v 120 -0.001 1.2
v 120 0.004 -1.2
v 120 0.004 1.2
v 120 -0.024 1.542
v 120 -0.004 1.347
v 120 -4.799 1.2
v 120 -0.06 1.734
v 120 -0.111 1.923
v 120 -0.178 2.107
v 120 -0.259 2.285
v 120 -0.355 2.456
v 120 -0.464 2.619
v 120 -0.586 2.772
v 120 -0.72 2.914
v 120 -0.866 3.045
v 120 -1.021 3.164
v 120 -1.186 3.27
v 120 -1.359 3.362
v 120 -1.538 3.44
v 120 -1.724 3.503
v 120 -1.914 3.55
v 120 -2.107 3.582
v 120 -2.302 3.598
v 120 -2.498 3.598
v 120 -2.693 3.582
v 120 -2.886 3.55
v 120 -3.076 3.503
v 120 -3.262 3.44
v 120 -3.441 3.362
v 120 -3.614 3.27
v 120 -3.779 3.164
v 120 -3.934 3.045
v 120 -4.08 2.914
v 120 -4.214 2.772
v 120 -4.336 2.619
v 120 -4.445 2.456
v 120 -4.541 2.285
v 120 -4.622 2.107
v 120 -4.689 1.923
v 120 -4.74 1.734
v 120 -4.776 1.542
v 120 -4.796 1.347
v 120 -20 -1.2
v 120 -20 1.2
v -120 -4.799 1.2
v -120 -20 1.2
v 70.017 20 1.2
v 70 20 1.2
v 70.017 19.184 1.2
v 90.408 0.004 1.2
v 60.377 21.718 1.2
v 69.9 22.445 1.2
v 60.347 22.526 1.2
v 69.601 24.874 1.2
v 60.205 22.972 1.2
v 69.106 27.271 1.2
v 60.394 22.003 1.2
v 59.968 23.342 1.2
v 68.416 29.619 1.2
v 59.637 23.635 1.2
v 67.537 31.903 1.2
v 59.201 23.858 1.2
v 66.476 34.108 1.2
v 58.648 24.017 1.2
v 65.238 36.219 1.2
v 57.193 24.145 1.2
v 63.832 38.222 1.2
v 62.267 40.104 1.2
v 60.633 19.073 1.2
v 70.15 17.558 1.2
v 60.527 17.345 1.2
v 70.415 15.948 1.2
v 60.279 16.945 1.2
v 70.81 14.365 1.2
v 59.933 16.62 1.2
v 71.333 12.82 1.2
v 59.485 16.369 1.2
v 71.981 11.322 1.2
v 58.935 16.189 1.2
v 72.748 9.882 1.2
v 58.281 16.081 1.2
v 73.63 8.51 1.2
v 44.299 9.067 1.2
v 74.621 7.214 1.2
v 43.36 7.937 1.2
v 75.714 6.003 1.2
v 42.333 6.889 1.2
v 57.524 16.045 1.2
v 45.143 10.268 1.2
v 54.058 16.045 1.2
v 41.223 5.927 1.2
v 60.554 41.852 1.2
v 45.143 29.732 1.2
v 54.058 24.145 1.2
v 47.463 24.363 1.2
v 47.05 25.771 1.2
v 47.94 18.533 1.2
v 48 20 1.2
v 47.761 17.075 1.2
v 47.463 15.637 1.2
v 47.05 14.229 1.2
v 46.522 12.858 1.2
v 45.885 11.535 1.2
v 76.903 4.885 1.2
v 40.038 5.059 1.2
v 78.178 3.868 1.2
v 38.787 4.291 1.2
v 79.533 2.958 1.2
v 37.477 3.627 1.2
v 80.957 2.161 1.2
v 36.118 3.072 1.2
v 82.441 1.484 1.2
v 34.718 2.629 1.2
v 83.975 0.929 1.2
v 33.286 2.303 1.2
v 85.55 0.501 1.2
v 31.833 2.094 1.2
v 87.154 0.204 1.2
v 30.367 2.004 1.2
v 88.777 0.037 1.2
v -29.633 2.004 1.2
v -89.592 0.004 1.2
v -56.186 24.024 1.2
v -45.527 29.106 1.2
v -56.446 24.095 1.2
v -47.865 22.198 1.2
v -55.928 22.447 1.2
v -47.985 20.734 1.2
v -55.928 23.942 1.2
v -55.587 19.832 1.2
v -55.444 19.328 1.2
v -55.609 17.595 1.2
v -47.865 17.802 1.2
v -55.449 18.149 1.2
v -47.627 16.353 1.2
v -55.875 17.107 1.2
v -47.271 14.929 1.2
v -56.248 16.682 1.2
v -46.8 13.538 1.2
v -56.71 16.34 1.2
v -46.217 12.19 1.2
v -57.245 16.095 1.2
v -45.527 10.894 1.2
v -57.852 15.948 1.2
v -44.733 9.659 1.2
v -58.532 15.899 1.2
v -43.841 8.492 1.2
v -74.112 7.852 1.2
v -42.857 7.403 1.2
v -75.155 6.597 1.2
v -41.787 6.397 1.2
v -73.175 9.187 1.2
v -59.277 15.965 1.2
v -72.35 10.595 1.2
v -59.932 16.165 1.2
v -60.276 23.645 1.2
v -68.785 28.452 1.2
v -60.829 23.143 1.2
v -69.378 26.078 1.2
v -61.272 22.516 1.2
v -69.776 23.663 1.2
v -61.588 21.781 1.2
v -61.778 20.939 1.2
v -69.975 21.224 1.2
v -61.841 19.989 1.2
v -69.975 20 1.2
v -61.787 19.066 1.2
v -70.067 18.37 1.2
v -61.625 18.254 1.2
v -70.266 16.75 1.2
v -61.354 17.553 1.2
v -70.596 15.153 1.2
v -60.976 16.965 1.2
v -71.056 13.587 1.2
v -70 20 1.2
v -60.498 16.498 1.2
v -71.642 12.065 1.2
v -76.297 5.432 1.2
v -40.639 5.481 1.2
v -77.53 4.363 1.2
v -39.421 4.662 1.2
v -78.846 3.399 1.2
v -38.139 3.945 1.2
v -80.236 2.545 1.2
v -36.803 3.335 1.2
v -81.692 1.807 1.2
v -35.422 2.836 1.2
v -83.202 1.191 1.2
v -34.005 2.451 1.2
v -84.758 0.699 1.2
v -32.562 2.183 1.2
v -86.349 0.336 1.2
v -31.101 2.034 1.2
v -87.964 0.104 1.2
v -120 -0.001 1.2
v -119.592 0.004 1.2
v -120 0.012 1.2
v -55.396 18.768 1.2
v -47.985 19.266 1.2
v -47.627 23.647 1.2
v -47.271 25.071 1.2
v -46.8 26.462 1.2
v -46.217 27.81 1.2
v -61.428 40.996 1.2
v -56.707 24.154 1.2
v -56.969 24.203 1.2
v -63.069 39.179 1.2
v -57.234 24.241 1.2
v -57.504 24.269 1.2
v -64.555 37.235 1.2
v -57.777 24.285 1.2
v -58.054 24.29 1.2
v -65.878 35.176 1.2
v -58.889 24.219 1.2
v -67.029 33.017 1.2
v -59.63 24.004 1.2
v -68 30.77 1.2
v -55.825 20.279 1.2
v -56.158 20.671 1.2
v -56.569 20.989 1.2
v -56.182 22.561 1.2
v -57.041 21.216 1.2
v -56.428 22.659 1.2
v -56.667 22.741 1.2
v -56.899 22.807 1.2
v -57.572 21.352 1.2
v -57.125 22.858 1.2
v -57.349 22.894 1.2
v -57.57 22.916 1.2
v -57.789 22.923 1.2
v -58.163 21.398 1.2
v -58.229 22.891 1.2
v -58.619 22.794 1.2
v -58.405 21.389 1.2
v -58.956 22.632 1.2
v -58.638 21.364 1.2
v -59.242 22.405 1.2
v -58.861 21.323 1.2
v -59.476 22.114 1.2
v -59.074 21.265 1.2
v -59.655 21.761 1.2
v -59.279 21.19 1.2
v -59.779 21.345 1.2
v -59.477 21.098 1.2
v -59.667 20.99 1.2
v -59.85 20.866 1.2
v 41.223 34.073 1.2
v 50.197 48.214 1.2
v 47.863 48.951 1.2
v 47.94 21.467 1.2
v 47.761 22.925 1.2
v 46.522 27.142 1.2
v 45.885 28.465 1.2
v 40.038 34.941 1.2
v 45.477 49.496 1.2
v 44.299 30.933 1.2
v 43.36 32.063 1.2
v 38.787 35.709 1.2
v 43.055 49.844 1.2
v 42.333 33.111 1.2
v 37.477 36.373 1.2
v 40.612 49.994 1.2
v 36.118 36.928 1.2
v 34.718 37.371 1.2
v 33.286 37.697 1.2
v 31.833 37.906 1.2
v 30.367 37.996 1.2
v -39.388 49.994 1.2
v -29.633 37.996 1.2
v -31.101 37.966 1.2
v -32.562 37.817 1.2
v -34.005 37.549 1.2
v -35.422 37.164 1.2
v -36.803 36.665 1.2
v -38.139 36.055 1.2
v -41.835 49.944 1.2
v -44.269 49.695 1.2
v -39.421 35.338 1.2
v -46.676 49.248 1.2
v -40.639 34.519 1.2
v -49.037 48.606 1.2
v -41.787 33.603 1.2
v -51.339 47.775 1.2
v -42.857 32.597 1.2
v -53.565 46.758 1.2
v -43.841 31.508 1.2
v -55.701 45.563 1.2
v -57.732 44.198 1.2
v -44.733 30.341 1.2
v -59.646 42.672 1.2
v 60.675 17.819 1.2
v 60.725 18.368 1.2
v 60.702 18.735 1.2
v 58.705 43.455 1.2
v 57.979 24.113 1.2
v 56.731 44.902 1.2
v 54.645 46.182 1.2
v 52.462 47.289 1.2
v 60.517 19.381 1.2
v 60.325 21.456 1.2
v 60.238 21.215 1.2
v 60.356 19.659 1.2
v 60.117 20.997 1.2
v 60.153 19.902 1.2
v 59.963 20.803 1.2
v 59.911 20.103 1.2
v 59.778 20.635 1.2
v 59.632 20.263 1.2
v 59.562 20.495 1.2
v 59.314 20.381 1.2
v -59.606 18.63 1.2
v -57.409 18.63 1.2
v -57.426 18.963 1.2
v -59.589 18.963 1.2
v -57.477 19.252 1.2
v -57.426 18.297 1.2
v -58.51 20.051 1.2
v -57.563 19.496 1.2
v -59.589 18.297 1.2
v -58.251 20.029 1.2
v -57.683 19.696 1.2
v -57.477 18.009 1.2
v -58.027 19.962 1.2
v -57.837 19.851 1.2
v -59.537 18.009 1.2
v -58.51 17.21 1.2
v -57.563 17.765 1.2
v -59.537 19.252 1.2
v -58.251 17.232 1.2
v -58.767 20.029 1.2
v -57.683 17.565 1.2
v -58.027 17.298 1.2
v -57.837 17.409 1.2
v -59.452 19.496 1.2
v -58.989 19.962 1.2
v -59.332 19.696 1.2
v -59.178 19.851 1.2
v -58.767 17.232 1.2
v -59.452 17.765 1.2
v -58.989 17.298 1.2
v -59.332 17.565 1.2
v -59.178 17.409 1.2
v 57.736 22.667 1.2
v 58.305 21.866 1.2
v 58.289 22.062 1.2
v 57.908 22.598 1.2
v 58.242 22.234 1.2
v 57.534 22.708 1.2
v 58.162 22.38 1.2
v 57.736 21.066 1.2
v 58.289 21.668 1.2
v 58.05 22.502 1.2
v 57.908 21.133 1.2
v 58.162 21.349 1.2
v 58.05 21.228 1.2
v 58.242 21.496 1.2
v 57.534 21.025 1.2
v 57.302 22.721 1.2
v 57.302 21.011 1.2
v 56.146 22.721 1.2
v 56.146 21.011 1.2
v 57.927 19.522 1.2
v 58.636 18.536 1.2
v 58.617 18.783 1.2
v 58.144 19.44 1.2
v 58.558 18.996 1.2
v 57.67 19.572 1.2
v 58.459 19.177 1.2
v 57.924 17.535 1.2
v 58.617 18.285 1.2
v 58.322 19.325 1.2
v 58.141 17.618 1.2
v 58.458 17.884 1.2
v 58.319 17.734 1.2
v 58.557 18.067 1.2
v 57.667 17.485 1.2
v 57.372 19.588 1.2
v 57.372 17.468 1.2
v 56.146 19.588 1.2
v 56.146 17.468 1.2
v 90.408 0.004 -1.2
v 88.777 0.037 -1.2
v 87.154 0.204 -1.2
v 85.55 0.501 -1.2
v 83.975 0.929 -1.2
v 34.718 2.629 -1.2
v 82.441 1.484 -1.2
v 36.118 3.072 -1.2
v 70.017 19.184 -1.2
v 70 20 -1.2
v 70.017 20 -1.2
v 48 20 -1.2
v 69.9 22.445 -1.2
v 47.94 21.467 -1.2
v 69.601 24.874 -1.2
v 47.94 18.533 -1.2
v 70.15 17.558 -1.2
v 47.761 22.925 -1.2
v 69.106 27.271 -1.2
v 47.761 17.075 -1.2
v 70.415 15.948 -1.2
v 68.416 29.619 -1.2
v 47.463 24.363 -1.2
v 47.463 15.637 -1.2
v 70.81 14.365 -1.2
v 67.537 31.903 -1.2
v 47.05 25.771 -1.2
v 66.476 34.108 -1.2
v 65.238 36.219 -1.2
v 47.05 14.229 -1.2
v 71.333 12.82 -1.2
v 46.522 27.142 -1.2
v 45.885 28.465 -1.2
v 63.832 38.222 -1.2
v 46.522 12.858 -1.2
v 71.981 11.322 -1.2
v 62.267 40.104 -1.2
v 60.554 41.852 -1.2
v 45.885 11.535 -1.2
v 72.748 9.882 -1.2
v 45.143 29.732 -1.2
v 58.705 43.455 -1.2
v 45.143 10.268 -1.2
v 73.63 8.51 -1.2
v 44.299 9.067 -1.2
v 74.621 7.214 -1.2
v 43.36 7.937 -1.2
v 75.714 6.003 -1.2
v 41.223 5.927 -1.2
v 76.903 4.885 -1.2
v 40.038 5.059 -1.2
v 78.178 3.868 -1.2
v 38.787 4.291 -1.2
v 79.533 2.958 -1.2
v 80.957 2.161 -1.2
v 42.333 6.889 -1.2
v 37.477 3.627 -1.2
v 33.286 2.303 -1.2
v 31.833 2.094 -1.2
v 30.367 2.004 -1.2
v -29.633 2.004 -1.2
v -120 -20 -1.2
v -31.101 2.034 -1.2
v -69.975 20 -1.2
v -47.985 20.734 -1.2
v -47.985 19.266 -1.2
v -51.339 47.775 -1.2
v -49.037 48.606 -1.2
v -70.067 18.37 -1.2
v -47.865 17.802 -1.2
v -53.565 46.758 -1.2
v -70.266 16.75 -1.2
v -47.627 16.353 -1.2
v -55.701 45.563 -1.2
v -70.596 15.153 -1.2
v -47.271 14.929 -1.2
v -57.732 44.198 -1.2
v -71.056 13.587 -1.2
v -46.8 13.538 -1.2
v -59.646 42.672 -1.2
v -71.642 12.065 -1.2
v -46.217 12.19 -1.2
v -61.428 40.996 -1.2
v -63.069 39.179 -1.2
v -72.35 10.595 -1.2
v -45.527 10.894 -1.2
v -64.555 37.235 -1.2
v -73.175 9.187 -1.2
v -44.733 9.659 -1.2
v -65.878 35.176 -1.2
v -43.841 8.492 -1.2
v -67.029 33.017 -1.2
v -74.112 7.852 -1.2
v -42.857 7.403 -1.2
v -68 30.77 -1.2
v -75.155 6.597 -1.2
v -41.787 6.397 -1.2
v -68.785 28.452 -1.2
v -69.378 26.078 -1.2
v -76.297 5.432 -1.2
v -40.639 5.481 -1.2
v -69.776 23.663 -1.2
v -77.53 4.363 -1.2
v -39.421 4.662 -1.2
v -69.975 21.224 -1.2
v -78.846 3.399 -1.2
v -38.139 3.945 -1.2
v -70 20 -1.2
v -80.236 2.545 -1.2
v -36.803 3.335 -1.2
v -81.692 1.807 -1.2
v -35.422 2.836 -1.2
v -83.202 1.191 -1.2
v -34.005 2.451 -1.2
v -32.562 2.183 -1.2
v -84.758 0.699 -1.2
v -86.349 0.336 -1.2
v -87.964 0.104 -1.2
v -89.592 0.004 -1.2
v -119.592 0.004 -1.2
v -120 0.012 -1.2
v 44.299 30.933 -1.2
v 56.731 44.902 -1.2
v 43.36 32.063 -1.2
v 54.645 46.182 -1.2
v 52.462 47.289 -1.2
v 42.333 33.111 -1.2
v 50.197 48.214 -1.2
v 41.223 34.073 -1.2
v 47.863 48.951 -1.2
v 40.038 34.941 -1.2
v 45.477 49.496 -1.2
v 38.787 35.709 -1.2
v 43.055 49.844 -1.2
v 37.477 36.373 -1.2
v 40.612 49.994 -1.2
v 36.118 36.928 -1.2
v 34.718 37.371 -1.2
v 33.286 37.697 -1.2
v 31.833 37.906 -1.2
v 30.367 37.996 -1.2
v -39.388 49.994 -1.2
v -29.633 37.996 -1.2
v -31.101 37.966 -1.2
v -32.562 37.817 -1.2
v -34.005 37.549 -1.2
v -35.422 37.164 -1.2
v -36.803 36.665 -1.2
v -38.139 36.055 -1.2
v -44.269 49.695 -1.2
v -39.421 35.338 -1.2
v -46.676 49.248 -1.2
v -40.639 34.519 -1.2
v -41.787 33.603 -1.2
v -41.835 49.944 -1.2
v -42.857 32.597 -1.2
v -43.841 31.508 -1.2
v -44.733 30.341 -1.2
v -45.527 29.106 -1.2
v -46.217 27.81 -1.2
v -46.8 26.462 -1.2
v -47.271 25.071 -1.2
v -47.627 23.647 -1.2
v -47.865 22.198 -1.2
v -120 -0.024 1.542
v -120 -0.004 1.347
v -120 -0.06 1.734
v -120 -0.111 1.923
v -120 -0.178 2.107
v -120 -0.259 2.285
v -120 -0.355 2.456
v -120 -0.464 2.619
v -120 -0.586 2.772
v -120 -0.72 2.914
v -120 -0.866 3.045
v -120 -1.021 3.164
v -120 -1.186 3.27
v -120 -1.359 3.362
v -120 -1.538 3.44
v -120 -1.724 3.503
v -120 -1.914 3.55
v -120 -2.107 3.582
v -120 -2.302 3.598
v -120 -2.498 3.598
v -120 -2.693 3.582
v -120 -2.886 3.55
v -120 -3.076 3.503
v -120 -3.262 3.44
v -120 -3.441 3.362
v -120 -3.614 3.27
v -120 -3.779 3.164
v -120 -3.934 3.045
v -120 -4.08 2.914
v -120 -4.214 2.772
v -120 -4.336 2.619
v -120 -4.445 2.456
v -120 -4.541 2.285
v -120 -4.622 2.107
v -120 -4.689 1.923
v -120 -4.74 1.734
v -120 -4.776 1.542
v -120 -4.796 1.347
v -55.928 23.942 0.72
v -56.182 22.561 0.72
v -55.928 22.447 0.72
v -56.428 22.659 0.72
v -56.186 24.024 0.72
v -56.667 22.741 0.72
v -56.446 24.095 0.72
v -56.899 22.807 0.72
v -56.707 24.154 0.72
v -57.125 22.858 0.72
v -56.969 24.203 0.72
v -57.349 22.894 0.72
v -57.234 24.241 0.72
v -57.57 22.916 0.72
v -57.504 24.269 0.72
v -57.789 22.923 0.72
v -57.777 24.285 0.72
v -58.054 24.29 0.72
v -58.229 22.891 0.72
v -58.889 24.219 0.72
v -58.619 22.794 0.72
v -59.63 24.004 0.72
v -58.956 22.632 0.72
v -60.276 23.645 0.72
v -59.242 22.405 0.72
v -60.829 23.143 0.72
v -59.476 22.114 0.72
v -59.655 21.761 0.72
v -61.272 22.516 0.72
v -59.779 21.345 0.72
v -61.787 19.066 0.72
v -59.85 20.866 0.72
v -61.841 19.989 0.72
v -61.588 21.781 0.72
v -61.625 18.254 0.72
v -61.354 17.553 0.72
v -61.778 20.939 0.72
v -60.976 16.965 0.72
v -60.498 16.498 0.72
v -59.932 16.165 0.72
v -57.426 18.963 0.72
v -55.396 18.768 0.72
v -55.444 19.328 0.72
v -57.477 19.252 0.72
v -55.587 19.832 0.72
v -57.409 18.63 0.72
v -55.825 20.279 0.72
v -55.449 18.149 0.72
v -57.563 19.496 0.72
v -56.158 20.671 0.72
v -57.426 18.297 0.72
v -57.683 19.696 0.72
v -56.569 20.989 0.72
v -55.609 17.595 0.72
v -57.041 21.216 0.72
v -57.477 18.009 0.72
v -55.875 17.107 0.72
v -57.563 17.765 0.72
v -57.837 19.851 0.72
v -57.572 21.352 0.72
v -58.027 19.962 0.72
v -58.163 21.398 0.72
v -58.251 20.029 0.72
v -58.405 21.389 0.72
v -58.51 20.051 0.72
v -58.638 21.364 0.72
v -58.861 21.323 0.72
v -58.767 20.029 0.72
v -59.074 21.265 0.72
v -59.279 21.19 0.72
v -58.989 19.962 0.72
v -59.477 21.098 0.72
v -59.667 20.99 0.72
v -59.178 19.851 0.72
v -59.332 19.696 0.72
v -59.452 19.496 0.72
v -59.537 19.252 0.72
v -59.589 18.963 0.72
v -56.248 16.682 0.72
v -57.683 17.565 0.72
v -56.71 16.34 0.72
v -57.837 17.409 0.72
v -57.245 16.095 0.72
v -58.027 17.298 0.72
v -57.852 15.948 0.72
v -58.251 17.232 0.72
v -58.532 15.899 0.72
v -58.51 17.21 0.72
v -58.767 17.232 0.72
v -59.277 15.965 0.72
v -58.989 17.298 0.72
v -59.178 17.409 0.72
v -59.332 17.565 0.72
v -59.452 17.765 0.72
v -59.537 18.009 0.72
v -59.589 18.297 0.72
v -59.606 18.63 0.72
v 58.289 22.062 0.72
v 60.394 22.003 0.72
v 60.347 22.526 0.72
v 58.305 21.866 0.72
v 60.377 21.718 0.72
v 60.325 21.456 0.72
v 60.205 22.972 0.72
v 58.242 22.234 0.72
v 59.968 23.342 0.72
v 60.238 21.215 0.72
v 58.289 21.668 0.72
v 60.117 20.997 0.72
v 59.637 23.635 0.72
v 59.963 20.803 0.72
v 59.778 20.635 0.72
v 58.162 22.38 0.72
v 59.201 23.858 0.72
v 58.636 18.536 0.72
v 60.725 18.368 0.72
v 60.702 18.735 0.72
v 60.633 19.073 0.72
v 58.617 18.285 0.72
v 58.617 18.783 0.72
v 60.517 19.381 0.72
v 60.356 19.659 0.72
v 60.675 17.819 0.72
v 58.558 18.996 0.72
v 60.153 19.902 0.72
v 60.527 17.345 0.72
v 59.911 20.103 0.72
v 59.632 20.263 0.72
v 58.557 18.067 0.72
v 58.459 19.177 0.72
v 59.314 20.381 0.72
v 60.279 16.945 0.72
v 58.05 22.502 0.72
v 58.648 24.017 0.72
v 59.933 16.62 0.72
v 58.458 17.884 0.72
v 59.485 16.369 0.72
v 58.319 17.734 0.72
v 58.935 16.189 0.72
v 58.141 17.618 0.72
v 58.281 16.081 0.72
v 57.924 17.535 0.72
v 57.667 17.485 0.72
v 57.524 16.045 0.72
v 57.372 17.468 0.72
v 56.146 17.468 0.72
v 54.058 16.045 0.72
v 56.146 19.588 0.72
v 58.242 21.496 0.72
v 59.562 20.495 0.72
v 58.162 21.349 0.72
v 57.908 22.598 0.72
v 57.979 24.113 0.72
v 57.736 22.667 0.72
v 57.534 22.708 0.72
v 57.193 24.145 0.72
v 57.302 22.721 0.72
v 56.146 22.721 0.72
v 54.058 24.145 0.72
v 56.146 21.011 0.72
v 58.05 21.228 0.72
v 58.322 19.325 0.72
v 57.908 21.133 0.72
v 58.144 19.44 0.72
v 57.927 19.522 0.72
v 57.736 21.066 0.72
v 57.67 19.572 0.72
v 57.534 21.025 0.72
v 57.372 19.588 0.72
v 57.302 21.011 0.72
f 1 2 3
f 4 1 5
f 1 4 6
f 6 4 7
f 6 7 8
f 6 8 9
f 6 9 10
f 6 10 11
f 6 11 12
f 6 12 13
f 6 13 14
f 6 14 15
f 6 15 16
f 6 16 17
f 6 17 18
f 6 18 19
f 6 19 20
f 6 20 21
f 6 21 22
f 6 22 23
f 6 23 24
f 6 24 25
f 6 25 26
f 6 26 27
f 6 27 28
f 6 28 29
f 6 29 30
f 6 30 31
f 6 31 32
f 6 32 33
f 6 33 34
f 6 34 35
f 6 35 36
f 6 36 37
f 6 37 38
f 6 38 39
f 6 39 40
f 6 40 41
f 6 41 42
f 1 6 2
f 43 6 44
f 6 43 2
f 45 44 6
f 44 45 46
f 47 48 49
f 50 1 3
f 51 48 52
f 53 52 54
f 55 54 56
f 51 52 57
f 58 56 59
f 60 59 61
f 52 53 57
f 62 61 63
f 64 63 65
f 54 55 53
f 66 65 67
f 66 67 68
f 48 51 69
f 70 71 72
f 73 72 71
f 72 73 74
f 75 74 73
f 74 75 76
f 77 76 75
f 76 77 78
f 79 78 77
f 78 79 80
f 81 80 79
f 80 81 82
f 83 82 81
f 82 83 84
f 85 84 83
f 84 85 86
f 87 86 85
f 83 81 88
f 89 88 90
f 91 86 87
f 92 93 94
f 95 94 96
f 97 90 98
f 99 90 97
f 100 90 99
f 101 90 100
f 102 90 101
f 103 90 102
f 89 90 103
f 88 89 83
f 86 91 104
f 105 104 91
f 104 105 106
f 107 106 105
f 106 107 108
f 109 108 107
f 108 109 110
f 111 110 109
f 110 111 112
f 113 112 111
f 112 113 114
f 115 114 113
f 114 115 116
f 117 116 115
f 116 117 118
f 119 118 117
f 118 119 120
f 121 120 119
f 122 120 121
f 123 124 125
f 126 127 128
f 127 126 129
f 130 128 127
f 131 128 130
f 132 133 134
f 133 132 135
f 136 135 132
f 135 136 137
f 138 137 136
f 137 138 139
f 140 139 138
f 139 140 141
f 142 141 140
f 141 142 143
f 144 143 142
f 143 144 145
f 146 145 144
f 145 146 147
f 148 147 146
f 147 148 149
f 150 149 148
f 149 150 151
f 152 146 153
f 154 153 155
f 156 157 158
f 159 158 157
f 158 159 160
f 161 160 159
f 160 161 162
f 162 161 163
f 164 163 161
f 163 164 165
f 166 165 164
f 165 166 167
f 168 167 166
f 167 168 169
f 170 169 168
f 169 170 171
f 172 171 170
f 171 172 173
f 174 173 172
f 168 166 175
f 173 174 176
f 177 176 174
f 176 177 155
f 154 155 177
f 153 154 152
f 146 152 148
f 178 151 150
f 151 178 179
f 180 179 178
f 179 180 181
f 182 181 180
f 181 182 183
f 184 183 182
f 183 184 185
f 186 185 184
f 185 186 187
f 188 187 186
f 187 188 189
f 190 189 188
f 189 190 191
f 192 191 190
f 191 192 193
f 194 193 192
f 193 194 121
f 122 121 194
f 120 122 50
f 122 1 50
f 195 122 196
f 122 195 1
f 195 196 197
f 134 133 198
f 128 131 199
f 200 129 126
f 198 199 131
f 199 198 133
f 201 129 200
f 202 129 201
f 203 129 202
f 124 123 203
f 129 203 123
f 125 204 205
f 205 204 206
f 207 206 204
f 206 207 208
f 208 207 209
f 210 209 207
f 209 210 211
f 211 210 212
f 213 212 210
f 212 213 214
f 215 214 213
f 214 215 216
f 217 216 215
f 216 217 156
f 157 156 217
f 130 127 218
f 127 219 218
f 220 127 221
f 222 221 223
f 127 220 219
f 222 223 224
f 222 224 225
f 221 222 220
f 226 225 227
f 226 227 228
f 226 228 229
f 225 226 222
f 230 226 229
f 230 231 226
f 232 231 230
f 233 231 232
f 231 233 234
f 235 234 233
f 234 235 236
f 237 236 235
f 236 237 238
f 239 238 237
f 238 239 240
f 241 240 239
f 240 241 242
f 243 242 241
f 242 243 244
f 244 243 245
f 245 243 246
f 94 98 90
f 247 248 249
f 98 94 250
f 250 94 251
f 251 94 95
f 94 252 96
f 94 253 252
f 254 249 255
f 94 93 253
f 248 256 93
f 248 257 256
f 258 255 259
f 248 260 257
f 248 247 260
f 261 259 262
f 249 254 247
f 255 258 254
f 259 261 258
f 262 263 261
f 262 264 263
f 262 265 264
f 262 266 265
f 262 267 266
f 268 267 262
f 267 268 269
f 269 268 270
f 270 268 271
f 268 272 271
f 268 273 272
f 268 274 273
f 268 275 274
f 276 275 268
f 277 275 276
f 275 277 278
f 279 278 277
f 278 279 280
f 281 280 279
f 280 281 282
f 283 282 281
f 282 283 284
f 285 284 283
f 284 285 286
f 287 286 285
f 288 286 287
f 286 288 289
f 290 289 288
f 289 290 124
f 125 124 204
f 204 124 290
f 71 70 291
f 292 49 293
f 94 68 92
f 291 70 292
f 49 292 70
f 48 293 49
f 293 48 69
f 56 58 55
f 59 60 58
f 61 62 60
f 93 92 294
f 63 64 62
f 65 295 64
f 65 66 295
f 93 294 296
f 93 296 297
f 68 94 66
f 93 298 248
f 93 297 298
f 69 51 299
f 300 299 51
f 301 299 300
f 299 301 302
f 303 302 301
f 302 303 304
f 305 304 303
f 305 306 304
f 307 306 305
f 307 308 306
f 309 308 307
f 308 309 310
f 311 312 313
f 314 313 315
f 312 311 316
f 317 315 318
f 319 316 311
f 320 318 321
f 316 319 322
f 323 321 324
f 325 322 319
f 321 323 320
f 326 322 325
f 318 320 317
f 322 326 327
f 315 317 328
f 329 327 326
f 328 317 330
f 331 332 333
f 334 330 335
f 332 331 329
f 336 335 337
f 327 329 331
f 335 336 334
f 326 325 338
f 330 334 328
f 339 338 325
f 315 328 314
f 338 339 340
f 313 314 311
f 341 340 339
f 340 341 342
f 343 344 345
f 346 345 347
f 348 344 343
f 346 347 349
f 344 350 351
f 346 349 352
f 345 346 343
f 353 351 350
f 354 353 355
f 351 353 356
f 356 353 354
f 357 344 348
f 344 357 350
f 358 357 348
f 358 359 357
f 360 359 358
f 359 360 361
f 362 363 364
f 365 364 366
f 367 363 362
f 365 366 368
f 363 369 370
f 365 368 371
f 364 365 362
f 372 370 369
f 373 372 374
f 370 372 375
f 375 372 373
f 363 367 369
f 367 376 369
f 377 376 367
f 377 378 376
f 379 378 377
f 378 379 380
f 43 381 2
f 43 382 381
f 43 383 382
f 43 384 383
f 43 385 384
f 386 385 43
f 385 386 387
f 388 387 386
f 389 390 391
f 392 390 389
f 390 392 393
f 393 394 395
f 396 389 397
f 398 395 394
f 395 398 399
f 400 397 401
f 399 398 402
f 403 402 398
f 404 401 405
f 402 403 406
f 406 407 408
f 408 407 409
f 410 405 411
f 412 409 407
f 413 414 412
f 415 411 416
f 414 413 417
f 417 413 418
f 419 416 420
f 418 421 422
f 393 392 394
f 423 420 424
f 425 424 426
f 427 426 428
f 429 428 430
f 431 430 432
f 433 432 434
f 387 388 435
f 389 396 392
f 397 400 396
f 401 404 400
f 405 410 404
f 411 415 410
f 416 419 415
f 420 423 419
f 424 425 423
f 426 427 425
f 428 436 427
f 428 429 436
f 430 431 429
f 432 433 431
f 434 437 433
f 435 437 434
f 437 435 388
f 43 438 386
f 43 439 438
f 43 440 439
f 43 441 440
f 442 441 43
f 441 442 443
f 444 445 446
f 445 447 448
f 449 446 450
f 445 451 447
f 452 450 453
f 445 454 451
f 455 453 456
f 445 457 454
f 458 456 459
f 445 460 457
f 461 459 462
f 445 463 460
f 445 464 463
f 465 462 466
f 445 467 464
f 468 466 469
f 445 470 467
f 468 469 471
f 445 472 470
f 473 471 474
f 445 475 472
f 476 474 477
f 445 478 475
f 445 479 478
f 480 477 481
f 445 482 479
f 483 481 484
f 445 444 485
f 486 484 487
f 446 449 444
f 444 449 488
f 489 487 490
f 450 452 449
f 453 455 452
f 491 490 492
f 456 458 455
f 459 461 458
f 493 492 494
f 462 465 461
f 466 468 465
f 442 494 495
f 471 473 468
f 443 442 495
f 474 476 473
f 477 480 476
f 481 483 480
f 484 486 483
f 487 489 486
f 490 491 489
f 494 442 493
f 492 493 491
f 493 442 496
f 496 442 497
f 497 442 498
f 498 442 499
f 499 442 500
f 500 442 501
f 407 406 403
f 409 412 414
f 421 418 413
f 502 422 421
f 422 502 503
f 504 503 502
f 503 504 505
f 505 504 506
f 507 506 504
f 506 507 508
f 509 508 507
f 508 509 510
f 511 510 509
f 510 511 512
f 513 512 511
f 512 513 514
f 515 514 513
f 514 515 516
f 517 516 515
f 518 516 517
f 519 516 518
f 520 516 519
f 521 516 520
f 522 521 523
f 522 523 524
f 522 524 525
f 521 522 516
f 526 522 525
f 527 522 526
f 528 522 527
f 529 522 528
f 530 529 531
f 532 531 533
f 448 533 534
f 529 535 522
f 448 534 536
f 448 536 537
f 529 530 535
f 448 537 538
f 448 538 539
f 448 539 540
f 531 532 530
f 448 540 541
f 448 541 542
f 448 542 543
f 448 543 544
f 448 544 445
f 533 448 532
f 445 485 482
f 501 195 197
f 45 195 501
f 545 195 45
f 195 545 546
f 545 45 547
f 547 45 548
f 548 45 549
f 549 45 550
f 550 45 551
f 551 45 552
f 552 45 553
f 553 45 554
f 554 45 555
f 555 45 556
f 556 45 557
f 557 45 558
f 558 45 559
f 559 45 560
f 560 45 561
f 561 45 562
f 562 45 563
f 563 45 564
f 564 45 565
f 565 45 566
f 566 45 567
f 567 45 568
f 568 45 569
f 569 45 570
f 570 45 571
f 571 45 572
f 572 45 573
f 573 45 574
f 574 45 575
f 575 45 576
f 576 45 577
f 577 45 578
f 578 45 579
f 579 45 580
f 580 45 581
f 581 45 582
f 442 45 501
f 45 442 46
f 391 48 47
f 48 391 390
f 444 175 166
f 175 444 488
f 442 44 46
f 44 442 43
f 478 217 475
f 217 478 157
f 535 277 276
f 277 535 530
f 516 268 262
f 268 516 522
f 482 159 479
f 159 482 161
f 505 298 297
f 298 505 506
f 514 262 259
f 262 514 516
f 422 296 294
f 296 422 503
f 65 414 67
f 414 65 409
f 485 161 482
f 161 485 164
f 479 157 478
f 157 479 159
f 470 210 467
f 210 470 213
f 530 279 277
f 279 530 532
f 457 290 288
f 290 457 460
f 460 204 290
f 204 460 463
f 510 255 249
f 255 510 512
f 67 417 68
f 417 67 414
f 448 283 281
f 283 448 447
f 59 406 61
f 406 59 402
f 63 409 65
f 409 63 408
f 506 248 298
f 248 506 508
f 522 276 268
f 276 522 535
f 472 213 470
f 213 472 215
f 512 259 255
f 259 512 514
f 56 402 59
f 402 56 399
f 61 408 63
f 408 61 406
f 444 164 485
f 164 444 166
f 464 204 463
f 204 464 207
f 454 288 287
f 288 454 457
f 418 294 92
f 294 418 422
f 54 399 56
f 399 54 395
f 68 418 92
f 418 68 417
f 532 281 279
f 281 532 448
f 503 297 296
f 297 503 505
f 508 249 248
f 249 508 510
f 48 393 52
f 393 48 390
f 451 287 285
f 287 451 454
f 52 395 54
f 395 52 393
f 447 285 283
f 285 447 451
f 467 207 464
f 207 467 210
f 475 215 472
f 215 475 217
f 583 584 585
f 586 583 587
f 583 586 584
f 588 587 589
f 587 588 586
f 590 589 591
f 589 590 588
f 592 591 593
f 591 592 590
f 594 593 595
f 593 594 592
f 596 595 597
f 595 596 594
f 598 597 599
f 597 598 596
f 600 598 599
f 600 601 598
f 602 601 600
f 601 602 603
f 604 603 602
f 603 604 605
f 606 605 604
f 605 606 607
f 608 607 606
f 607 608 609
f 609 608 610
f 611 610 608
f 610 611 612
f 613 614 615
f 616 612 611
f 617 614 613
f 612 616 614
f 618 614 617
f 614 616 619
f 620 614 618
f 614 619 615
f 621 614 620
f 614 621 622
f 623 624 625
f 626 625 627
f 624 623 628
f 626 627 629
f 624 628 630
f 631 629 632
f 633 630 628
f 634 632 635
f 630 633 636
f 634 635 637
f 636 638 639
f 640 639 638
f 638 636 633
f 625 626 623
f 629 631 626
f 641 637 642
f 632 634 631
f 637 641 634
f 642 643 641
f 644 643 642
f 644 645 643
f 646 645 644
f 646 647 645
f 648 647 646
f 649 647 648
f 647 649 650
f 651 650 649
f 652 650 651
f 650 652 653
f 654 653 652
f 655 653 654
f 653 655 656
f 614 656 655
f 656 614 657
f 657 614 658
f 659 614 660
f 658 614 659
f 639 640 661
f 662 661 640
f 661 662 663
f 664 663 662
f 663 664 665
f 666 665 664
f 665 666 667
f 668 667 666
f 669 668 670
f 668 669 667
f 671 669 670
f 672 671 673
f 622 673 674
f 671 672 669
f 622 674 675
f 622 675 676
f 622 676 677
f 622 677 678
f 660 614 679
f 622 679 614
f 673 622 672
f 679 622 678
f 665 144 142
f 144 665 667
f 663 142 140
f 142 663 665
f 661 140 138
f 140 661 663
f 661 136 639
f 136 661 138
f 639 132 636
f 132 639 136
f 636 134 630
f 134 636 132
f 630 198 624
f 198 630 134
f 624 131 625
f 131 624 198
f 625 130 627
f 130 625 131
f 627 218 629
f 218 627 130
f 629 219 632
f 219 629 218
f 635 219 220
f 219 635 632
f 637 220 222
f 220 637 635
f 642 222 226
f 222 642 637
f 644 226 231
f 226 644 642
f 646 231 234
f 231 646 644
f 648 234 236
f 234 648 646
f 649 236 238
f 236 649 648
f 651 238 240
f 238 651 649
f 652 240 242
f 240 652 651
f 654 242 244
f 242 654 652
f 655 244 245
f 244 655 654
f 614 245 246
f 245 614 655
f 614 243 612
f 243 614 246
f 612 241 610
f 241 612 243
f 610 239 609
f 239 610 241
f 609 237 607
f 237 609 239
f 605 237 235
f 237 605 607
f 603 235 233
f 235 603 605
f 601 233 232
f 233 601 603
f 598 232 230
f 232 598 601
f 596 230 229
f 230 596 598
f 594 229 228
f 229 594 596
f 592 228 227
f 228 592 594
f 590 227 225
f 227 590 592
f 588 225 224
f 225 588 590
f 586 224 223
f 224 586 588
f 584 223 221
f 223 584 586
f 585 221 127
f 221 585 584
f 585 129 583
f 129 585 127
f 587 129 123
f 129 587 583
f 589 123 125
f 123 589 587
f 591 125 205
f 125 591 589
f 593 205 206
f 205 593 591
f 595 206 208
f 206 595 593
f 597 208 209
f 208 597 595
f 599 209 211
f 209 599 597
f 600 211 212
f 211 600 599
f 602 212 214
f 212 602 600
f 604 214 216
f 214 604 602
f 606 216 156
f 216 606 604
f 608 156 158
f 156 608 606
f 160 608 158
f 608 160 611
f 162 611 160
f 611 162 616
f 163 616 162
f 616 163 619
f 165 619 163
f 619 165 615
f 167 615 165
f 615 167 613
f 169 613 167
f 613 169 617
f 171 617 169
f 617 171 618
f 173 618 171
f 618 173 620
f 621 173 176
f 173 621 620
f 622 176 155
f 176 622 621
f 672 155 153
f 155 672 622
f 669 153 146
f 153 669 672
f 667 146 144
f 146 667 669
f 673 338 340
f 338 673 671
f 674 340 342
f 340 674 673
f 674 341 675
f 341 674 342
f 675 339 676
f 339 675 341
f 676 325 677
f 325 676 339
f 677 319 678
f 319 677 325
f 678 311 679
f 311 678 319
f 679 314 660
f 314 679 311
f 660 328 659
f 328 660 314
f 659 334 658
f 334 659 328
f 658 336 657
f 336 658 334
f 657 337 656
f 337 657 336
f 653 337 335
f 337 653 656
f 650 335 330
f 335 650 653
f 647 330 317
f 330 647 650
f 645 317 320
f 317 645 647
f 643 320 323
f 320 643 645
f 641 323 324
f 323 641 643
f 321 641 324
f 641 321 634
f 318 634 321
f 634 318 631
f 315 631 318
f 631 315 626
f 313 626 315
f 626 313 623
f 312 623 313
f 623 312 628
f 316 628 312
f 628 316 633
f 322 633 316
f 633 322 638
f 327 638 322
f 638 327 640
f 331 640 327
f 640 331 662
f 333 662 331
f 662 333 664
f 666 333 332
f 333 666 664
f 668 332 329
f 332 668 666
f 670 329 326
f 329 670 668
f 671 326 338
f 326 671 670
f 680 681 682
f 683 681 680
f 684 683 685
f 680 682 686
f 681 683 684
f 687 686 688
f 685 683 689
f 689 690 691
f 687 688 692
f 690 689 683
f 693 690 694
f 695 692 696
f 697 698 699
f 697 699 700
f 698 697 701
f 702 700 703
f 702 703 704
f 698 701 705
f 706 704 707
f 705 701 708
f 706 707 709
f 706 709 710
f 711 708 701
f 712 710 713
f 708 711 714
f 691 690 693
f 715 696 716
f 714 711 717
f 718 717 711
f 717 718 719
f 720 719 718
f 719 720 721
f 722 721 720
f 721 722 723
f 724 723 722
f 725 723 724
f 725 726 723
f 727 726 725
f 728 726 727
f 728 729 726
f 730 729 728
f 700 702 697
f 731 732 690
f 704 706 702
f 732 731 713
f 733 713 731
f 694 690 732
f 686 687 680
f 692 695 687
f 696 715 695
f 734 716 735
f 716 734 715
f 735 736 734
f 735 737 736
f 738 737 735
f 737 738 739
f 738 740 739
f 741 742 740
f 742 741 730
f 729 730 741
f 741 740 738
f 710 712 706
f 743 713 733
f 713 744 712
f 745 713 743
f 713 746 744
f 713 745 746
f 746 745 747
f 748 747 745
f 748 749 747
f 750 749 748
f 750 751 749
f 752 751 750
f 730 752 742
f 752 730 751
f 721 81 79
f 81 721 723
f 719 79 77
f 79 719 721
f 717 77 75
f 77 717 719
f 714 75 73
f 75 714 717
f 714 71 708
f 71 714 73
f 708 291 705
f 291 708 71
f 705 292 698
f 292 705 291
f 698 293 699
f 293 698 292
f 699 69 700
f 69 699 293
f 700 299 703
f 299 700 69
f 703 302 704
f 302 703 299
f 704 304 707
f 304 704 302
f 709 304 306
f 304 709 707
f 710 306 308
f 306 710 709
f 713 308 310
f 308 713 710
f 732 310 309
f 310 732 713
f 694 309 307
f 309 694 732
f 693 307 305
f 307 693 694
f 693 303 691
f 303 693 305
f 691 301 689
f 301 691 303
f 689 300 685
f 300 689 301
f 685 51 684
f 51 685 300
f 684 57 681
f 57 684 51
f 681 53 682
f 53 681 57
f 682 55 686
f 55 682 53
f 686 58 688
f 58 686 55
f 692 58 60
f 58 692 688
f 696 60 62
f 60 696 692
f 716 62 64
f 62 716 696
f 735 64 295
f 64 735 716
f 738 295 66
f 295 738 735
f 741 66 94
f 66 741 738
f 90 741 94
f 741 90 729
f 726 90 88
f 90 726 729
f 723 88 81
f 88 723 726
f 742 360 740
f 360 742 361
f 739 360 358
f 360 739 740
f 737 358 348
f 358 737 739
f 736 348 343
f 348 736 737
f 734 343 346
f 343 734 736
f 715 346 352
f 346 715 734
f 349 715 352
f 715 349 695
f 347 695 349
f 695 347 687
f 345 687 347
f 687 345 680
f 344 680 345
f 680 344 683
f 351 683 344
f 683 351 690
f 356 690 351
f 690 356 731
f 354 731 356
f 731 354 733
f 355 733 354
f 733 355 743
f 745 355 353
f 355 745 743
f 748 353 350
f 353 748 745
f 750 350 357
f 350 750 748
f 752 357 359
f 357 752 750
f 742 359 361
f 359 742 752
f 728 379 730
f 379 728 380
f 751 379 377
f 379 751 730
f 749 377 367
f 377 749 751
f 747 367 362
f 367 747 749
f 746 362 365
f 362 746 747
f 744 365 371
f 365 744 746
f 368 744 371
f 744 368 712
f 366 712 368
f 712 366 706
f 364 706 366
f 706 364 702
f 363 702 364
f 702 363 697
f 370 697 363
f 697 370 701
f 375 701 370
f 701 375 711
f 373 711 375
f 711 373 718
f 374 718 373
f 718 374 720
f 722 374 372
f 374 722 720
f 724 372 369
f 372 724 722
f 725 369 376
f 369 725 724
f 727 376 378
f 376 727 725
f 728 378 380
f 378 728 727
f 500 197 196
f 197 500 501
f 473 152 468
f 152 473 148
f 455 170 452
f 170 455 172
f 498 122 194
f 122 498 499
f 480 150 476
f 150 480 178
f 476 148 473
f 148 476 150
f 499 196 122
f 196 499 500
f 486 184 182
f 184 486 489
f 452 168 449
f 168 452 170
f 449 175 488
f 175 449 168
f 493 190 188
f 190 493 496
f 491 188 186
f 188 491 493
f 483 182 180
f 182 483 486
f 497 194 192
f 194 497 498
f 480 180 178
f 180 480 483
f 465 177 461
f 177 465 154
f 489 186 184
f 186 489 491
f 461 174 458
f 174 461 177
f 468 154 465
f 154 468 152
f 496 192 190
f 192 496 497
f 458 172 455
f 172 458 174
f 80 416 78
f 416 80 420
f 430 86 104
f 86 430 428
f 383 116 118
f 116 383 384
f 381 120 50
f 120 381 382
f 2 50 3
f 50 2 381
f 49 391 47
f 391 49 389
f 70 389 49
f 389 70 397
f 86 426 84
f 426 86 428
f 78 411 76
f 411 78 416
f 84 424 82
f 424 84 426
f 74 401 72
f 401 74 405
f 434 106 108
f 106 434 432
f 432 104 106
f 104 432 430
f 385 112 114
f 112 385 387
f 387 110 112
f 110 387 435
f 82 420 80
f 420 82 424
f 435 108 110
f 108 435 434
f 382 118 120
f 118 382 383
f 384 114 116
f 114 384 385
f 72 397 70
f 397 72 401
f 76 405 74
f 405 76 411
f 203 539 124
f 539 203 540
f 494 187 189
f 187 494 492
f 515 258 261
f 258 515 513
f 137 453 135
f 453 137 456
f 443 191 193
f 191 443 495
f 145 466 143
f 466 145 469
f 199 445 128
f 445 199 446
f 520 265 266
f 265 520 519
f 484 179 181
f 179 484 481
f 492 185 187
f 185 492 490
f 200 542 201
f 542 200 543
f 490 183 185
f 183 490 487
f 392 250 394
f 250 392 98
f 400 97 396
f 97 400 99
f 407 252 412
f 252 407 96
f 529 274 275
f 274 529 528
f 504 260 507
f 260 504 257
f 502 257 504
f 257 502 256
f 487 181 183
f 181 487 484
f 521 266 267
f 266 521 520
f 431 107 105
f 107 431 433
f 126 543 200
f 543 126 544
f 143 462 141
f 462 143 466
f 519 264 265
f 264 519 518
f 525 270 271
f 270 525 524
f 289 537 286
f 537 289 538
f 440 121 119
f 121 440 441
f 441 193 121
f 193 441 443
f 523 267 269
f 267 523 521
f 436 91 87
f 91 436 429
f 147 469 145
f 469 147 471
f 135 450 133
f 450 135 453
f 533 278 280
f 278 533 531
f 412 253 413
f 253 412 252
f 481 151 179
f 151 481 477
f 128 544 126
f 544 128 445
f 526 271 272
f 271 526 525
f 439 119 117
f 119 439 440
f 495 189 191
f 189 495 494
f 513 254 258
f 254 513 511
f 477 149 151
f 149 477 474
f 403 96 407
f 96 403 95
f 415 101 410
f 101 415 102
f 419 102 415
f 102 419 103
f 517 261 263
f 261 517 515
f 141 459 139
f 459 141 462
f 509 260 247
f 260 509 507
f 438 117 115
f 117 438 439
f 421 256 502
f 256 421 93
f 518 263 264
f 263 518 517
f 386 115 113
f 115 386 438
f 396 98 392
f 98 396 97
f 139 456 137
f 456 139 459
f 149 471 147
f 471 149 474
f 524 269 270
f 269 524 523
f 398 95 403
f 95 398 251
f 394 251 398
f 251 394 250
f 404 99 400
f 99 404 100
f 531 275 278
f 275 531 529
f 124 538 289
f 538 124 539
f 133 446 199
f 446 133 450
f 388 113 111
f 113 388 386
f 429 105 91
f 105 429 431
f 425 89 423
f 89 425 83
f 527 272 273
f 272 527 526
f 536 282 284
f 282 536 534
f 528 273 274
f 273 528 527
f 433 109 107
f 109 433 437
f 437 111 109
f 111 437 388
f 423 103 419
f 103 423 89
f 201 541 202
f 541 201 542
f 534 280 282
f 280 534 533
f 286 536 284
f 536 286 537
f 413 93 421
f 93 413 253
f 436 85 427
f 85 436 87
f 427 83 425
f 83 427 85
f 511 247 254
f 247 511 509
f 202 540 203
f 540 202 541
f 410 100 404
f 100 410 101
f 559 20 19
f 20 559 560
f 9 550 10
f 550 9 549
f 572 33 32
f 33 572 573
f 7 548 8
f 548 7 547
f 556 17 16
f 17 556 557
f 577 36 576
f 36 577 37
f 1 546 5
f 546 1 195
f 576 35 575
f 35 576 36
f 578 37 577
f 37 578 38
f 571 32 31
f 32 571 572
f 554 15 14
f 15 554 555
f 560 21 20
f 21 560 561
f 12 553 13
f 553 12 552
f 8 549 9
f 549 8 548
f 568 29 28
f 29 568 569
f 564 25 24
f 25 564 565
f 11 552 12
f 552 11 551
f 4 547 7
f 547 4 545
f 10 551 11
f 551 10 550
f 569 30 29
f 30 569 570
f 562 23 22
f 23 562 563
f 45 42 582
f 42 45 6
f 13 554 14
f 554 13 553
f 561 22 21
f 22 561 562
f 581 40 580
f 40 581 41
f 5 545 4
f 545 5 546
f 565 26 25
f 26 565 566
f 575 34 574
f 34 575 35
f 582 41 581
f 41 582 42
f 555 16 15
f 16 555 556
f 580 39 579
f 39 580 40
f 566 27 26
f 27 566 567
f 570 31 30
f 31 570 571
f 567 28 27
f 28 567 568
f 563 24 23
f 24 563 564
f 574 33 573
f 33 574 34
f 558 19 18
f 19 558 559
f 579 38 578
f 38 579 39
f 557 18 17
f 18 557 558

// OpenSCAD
// file: ../Parts/rounder.scad
// rounder.scad
// cutting tool for rounding off corners with a cylinder

//---------------------
module rounder(
r=10,   // radius
h=10,   // height
f=22,    // $fn
extra=0.01  // extra size for the cube
){

difference(){
  translate([-extra,-extra,-extra])
  cube([r+extra,r+extra,h+2*extra]);
  translate([r,r,-1])
  cylinder(r=r,h=h+2,$fn=f);
}

}

//---------------------------------------------------------------------------
module bevel(x=1,y=1,h=10){

linear_extrude(height=h)
polygon(points=[[0,0],[x,0],[0,y]]);
    
}
  

//========================

rounder();

//========================
// main file
//=================================================================================
// PlanterHandle.scad
//
// Handles for the 10x20" planter trays
//
// Dr Tom Flint, 9 Dec 2025
//=================================================================================

use <../Parts/rounder.scad>


layer = 0.24;
thick = 10*layer;

F1=77;

//-----------------------------------------------------------------------------------
module PlanterHandle(){

  translate([0,-thick,thick/2])
  rotate([0,90,0])
  cylinder(r=thick,h=240,center=true,$fn=F1);

  difference(){
    union(){
      cube([240,40,thick],center=true);
      hull(){
        translate([-40,20,0])
        cylinder(r=30,h=thick,center=true,$fn=F1);
        translate([40,20,0])
        cylinder(r=30,h=thick,center=true,$fn=F1);
      }
    }
    // left side      
    hull(){
      translate([-120,20,0])
      cylinder(r=20,h=3*thick,center=true,$fn=F1);
      translate([-90,20,0])
      cylinder(r=20,h=3*thick,center=true,$fn=F1);
    }
    // left side      
    hull(){
      translate([120,20,0])
      cylinder(r=20,h=3*thick,center=true,$fn=F1);
      translate([90,20,0])
      cylinder(r=20,h=3*thick,center=true,$fn=F1);
    }  
    // finger hole
    hull(){
      translate([-30,20,0])
      cylinder(r=18,h=3*thick,center=true,$fn=F1);
      translate([30,20,0])
      cylinder(r=18,h=3*thick,center=true,$fn=F1);
    }
    Label(Num,AB);
  }
    
}

//-----------------------------------------------------------------------------------
module Label(txt1,txt2){

  translate([-58,20,thick/2-2*layer])
  linear_extrude(height=4*layer)
  text(txt1, font = "Open Sans:style=Bold", size=8,halign="center",valign="center",spacing=1.2);
  translate([58,20,thick/2-2*layer])
  linear_extrude(height=4*layer)
  text(txt2, font = "Open Sans:style=Bold", size=8,halign="center",valign="center",spacing=1.2);

}

//=================================================================================

Num = "6";
AB = "B";

PlanterHandle();
//~ Label(Num,AB);

//=================================================================================
